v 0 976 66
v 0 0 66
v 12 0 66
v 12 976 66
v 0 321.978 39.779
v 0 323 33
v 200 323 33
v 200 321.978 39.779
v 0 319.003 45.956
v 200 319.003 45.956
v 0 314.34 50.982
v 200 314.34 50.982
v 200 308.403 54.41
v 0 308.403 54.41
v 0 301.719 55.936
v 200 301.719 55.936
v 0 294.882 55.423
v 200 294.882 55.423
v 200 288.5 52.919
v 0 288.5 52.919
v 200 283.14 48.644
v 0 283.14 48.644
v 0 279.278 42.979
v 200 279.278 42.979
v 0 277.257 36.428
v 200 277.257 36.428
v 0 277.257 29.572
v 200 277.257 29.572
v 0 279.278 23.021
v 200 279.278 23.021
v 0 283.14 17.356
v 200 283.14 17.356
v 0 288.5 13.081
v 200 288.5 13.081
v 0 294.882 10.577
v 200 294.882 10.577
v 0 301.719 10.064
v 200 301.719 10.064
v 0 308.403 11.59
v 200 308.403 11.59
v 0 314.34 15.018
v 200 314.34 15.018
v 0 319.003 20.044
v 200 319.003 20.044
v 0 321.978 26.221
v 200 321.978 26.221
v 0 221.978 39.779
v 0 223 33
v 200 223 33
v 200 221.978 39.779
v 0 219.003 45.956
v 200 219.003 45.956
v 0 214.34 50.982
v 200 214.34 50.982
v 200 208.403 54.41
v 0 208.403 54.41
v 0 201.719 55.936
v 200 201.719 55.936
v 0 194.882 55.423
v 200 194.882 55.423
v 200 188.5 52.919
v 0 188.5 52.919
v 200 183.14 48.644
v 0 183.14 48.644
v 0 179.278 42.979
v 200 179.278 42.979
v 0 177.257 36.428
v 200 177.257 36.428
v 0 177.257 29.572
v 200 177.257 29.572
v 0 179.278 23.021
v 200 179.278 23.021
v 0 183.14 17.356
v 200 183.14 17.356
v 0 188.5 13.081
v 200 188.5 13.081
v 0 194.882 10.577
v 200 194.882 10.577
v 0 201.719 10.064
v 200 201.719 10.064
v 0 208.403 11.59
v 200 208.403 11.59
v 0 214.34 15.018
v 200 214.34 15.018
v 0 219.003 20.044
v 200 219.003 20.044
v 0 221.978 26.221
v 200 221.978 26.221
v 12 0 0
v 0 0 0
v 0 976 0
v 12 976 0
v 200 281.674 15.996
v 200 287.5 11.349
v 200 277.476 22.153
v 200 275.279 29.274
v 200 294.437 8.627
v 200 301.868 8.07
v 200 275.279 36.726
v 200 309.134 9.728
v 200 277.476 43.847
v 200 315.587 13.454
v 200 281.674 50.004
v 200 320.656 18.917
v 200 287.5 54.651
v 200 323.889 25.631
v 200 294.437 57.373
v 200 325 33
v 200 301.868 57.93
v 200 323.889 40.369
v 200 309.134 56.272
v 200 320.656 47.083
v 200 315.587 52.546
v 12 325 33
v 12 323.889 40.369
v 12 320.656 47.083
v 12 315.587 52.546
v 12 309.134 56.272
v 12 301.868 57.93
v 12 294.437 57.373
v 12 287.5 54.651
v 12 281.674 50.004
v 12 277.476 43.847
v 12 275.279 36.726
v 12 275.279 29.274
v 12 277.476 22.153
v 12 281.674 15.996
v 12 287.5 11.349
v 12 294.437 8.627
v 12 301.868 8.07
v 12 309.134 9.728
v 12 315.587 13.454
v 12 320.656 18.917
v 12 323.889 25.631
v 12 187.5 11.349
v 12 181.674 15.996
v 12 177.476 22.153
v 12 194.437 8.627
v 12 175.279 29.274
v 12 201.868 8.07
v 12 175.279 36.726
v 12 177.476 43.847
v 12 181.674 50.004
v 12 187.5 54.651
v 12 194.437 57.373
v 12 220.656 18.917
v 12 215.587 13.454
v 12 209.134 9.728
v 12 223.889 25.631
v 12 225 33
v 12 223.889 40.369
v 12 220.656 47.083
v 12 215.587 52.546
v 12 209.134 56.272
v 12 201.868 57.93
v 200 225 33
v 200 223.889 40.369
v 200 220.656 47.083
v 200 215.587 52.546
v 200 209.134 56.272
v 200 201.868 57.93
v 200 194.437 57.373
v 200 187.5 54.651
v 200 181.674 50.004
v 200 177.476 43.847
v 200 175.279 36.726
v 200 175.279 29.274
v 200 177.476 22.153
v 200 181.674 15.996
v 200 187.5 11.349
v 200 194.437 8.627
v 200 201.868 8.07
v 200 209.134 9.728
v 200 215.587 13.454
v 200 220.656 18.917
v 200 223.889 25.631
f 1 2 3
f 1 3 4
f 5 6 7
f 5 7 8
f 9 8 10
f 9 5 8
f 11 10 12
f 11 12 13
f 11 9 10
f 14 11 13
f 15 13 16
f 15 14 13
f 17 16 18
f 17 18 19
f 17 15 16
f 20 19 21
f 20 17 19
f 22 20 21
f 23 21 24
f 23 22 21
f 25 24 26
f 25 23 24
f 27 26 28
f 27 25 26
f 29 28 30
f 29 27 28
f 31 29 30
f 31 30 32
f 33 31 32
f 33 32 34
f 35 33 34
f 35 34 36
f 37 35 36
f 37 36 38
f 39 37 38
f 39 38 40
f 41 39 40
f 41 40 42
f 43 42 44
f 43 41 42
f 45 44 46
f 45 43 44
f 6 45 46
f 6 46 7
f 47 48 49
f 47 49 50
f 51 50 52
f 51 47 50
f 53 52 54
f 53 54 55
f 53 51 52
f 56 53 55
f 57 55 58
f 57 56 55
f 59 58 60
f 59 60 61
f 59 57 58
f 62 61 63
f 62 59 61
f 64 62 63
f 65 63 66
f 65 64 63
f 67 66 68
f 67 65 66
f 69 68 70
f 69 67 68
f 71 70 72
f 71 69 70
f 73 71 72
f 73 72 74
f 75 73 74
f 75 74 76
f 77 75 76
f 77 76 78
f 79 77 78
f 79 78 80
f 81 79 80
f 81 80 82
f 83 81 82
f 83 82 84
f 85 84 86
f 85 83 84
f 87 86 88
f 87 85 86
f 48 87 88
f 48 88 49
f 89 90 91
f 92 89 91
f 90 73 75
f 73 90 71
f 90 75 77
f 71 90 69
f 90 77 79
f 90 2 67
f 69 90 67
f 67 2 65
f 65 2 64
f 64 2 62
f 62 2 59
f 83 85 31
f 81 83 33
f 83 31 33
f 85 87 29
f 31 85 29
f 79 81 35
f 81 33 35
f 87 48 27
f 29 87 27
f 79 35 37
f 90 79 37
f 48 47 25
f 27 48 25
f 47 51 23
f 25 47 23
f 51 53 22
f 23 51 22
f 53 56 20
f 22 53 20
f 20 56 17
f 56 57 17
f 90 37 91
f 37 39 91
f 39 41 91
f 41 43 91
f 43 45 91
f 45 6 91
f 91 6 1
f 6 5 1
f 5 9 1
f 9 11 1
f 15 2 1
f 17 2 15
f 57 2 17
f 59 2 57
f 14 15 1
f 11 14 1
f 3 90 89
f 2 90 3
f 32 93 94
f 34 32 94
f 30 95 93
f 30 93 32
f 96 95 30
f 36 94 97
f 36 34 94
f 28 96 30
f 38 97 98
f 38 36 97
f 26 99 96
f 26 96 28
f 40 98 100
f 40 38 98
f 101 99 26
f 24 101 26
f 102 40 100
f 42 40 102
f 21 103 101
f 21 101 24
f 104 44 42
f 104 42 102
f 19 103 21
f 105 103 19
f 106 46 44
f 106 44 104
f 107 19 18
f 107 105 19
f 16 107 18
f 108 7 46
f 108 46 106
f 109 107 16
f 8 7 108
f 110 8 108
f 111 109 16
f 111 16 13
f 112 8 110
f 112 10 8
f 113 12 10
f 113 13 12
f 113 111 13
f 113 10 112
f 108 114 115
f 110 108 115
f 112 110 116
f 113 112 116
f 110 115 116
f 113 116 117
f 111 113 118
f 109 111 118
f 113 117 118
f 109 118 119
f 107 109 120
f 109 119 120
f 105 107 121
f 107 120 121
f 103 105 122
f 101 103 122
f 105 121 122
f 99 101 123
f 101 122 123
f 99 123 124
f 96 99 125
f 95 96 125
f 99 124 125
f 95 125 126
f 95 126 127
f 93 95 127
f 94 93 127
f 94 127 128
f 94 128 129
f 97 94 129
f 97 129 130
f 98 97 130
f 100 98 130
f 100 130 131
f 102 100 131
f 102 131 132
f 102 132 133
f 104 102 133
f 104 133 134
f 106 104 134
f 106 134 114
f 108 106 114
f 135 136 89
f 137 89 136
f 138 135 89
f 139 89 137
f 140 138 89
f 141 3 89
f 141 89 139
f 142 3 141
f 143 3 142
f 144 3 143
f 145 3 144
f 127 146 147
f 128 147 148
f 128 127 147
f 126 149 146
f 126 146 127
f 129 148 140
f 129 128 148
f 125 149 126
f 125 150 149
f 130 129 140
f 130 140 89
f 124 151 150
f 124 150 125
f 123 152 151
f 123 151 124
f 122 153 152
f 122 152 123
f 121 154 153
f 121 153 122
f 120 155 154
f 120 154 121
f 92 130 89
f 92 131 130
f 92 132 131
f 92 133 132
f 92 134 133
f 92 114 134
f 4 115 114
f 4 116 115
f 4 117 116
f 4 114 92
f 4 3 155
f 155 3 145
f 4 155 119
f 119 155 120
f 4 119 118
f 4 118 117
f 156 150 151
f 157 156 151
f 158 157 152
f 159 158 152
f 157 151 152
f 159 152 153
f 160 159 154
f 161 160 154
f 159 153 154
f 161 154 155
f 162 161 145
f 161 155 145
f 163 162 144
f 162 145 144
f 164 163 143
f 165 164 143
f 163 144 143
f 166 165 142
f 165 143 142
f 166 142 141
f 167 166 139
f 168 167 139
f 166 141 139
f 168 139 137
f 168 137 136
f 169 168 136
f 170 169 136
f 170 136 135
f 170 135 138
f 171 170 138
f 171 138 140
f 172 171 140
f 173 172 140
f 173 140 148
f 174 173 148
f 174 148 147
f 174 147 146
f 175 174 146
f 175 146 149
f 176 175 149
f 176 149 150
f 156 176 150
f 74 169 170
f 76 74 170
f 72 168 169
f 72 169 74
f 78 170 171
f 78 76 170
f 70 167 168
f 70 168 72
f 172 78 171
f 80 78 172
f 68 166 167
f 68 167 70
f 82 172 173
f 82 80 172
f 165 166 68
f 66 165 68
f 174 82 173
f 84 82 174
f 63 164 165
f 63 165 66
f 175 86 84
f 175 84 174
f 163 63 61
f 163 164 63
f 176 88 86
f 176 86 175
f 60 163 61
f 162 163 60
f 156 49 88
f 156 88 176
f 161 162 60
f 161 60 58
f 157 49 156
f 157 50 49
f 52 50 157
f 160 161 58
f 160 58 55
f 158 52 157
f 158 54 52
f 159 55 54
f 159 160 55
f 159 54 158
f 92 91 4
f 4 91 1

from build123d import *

# Parameters (mm, degrees)
F0_W     = 976
F0_H     = 66
F0_R     = 25
F1_DEPTH = 12
F0_R_2   = 22.999999
F2_DEPTH = 200
F0_R_3   = 23
F3_DEPTH = 200


with BuildPart() as f1:
    # F0 (on Right) → F1 (new body)
    with BuildSketch(Plane.YZ):
        with Locations((488, 33)):
            Rectangle(F0_W, F0_H)
        with Locations((200, 33)):
            Circle(F0_R, mode=Mode.SUBTRACT)
        with Locations((300, 33)):
            Circle(F0_R, mode=Mode.SUBTRACT)
    extrude(amount=F1_DEPTH)

    # F0 (on Right) → F2 (join)
    with BuildSketch(Plane.YZ):
        with Locations((200, 33)):
            Circle(F0_R)
        with Locations((200, 33)):
            Circle(F0_R_2, mode=Mode.SUBTRACT)
    extrude(amount=F2_DEPTH)

    # F0 (on Right) → F3 (join)
    with BuildSketch(Plane.YZ):
        with Locations((300, 33)):
            Circle(F0_R)
        with Locations((300, 33)):
            Circle(F0_R_3, mode=Mode.SUBTRACT)
    extrude(amount=F3_DEPTH)


solid = f1.part
